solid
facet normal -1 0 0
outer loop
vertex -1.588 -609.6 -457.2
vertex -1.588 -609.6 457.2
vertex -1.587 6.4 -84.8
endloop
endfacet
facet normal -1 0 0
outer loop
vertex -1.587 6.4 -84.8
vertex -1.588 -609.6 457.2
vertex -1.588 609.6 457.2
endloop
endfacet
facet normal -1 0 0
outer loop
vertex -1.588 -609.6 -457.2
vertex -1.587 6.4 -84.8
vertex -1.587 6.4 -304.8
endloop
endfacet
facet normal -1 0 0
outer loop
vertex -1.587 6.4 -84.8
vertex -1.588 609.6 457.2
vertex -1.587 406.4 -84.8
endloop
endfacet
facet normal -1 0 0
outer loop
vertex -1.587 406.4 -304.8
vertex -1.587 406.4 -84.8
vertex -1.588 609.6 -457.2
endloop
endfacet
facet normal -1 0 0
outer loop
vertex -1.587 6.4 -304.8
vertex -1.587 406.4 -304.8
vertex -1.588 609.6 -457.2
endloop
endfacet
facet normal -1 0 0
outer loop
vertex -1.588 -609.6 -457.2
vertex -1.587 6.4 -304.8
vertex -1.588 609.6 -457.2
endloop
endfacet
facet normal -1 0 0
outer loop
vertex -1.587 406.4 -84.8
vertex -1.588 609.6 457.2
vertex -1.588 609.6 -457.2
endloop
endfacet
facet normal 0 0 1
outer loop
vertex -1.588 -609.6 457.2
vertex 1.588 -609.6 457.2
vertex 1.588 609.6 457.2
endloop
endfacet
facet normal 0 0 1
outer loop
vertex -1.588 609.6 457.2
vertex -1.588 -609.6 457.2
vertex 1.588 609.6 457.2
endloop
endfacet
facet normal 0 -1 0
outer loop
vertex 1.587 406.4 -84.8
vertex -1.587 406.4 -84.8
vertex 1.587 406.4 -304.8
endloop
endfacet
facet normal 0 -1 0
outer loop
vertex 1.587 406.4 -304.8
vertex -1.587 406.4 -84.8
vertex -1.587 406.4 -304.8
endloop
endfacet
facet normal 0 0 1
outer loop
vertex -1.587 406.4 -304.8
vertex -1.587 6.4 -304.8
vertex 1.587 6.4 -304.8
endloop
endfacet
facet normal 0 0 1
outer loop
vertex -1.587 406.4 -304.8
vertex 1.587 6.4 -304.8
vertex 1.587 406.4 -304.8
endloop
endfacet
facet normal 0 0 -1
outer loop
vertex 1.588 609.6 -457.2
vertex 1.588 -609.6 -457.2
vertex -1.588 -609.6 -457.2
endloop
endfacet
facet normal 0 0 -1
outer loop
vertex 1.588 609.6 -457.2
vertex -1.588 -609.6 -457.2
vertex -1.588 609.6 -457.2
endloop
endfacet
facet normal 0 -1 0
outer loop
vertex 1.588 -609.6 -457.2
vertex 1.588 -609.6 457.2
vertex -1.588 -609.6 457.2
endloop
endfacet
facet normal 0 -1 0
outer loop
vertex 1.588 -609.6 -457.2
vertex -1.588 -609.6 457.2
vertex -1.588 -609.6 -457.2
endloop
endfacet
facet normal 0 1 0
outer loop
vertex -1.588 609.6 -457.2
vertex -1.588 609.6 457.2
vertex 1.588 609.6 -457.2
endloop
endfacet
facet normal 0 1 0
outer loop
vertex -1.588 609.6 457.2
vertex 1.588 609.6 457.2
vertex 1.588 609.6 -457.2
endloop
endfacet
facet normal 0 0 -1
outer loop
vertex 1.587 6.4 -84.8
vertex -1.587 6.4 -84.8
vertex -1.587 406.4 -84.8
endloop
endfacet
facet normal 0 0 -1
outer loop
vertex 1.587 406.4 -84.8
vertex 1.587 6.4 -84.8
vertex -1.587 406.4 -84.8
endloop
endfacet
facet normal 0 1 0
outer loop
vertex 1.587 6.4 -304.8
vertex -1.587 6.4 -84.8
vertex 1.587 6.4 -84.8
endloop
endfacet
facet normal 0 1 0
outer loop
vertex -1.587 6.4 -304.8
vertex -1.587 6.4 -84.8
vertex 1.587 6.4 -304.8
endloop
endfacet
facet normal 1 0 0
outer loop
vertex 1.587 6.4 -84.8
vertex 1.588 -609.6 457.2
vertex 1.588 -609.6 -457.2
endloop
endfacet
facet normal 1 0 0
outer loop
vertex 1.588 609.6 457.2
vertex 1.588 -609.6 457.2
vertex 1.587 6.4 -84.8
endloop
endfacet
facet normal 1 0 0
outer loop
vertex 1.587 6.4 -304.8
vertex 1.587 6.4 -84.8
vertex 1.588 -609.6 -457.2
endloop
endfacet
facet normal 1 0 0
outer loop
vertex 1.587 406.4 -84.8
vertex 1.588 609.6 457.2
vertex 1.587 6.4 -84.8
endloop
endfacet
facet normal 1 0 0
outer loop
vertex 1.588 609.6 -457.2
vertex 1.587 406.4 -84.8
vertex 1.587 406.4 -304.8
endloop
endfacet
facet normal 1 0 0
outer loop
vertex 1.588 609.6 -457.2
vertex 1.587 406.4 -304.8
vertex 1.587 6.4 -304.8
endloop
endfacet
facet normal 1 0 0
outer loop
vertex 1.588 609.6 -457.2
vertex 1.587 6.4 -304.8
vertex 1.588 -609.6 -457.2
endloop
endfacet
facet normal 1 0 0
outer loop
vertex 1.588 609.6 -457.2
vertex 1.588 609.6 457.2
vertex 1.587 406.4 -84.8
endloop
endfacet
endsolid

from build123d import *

# Parameters (mm, degrees)
SKETCH1_W            = 914.4
SKETCH1_H            = 1219.2
PLATE_BASE_DEPTH     = 1.5875
TANK_HOLE_DEPTH      = 763.001653644
TANK_HOLE_DEPTH_BACK = 763.001653644
SKETCH4_W            = 220
SKETCH4_H            = 400


with BuildPart() as part:
    # Sketch1 → Plate_Base (new, symmetric)
    with BuildSketch(Plane(origin=(0, 0, 0), x_dir=(0, 0, -1), z_dir=(1, 0, 0))):
        Rectangle(SKETCH1_W, SKETCH1_H)
    extrude(amount=PLATE_BASE_DEPTH, both=True)

    # Sketch4 → Tank_Hole (cut, two sides: drawn at the far end of the back side and taken through both)
    with BuildSketch(Plane(origin=(0, 0, 0), x_dir=(0, 0, -1), z_dir=(1, 0, 0)).offset(-TANK_HOLE_DEPTH_BACK)):
        with Locations((194.8, 206.4)):
            Rectangle(SKETCH4_W, SKETCH4_H)
    extrude(amount=TANK_HOLE_DEPTH + TANK_HOLE_DEPTH_BACK, mode=Mode.SUBTRACT)


solid = part.part
